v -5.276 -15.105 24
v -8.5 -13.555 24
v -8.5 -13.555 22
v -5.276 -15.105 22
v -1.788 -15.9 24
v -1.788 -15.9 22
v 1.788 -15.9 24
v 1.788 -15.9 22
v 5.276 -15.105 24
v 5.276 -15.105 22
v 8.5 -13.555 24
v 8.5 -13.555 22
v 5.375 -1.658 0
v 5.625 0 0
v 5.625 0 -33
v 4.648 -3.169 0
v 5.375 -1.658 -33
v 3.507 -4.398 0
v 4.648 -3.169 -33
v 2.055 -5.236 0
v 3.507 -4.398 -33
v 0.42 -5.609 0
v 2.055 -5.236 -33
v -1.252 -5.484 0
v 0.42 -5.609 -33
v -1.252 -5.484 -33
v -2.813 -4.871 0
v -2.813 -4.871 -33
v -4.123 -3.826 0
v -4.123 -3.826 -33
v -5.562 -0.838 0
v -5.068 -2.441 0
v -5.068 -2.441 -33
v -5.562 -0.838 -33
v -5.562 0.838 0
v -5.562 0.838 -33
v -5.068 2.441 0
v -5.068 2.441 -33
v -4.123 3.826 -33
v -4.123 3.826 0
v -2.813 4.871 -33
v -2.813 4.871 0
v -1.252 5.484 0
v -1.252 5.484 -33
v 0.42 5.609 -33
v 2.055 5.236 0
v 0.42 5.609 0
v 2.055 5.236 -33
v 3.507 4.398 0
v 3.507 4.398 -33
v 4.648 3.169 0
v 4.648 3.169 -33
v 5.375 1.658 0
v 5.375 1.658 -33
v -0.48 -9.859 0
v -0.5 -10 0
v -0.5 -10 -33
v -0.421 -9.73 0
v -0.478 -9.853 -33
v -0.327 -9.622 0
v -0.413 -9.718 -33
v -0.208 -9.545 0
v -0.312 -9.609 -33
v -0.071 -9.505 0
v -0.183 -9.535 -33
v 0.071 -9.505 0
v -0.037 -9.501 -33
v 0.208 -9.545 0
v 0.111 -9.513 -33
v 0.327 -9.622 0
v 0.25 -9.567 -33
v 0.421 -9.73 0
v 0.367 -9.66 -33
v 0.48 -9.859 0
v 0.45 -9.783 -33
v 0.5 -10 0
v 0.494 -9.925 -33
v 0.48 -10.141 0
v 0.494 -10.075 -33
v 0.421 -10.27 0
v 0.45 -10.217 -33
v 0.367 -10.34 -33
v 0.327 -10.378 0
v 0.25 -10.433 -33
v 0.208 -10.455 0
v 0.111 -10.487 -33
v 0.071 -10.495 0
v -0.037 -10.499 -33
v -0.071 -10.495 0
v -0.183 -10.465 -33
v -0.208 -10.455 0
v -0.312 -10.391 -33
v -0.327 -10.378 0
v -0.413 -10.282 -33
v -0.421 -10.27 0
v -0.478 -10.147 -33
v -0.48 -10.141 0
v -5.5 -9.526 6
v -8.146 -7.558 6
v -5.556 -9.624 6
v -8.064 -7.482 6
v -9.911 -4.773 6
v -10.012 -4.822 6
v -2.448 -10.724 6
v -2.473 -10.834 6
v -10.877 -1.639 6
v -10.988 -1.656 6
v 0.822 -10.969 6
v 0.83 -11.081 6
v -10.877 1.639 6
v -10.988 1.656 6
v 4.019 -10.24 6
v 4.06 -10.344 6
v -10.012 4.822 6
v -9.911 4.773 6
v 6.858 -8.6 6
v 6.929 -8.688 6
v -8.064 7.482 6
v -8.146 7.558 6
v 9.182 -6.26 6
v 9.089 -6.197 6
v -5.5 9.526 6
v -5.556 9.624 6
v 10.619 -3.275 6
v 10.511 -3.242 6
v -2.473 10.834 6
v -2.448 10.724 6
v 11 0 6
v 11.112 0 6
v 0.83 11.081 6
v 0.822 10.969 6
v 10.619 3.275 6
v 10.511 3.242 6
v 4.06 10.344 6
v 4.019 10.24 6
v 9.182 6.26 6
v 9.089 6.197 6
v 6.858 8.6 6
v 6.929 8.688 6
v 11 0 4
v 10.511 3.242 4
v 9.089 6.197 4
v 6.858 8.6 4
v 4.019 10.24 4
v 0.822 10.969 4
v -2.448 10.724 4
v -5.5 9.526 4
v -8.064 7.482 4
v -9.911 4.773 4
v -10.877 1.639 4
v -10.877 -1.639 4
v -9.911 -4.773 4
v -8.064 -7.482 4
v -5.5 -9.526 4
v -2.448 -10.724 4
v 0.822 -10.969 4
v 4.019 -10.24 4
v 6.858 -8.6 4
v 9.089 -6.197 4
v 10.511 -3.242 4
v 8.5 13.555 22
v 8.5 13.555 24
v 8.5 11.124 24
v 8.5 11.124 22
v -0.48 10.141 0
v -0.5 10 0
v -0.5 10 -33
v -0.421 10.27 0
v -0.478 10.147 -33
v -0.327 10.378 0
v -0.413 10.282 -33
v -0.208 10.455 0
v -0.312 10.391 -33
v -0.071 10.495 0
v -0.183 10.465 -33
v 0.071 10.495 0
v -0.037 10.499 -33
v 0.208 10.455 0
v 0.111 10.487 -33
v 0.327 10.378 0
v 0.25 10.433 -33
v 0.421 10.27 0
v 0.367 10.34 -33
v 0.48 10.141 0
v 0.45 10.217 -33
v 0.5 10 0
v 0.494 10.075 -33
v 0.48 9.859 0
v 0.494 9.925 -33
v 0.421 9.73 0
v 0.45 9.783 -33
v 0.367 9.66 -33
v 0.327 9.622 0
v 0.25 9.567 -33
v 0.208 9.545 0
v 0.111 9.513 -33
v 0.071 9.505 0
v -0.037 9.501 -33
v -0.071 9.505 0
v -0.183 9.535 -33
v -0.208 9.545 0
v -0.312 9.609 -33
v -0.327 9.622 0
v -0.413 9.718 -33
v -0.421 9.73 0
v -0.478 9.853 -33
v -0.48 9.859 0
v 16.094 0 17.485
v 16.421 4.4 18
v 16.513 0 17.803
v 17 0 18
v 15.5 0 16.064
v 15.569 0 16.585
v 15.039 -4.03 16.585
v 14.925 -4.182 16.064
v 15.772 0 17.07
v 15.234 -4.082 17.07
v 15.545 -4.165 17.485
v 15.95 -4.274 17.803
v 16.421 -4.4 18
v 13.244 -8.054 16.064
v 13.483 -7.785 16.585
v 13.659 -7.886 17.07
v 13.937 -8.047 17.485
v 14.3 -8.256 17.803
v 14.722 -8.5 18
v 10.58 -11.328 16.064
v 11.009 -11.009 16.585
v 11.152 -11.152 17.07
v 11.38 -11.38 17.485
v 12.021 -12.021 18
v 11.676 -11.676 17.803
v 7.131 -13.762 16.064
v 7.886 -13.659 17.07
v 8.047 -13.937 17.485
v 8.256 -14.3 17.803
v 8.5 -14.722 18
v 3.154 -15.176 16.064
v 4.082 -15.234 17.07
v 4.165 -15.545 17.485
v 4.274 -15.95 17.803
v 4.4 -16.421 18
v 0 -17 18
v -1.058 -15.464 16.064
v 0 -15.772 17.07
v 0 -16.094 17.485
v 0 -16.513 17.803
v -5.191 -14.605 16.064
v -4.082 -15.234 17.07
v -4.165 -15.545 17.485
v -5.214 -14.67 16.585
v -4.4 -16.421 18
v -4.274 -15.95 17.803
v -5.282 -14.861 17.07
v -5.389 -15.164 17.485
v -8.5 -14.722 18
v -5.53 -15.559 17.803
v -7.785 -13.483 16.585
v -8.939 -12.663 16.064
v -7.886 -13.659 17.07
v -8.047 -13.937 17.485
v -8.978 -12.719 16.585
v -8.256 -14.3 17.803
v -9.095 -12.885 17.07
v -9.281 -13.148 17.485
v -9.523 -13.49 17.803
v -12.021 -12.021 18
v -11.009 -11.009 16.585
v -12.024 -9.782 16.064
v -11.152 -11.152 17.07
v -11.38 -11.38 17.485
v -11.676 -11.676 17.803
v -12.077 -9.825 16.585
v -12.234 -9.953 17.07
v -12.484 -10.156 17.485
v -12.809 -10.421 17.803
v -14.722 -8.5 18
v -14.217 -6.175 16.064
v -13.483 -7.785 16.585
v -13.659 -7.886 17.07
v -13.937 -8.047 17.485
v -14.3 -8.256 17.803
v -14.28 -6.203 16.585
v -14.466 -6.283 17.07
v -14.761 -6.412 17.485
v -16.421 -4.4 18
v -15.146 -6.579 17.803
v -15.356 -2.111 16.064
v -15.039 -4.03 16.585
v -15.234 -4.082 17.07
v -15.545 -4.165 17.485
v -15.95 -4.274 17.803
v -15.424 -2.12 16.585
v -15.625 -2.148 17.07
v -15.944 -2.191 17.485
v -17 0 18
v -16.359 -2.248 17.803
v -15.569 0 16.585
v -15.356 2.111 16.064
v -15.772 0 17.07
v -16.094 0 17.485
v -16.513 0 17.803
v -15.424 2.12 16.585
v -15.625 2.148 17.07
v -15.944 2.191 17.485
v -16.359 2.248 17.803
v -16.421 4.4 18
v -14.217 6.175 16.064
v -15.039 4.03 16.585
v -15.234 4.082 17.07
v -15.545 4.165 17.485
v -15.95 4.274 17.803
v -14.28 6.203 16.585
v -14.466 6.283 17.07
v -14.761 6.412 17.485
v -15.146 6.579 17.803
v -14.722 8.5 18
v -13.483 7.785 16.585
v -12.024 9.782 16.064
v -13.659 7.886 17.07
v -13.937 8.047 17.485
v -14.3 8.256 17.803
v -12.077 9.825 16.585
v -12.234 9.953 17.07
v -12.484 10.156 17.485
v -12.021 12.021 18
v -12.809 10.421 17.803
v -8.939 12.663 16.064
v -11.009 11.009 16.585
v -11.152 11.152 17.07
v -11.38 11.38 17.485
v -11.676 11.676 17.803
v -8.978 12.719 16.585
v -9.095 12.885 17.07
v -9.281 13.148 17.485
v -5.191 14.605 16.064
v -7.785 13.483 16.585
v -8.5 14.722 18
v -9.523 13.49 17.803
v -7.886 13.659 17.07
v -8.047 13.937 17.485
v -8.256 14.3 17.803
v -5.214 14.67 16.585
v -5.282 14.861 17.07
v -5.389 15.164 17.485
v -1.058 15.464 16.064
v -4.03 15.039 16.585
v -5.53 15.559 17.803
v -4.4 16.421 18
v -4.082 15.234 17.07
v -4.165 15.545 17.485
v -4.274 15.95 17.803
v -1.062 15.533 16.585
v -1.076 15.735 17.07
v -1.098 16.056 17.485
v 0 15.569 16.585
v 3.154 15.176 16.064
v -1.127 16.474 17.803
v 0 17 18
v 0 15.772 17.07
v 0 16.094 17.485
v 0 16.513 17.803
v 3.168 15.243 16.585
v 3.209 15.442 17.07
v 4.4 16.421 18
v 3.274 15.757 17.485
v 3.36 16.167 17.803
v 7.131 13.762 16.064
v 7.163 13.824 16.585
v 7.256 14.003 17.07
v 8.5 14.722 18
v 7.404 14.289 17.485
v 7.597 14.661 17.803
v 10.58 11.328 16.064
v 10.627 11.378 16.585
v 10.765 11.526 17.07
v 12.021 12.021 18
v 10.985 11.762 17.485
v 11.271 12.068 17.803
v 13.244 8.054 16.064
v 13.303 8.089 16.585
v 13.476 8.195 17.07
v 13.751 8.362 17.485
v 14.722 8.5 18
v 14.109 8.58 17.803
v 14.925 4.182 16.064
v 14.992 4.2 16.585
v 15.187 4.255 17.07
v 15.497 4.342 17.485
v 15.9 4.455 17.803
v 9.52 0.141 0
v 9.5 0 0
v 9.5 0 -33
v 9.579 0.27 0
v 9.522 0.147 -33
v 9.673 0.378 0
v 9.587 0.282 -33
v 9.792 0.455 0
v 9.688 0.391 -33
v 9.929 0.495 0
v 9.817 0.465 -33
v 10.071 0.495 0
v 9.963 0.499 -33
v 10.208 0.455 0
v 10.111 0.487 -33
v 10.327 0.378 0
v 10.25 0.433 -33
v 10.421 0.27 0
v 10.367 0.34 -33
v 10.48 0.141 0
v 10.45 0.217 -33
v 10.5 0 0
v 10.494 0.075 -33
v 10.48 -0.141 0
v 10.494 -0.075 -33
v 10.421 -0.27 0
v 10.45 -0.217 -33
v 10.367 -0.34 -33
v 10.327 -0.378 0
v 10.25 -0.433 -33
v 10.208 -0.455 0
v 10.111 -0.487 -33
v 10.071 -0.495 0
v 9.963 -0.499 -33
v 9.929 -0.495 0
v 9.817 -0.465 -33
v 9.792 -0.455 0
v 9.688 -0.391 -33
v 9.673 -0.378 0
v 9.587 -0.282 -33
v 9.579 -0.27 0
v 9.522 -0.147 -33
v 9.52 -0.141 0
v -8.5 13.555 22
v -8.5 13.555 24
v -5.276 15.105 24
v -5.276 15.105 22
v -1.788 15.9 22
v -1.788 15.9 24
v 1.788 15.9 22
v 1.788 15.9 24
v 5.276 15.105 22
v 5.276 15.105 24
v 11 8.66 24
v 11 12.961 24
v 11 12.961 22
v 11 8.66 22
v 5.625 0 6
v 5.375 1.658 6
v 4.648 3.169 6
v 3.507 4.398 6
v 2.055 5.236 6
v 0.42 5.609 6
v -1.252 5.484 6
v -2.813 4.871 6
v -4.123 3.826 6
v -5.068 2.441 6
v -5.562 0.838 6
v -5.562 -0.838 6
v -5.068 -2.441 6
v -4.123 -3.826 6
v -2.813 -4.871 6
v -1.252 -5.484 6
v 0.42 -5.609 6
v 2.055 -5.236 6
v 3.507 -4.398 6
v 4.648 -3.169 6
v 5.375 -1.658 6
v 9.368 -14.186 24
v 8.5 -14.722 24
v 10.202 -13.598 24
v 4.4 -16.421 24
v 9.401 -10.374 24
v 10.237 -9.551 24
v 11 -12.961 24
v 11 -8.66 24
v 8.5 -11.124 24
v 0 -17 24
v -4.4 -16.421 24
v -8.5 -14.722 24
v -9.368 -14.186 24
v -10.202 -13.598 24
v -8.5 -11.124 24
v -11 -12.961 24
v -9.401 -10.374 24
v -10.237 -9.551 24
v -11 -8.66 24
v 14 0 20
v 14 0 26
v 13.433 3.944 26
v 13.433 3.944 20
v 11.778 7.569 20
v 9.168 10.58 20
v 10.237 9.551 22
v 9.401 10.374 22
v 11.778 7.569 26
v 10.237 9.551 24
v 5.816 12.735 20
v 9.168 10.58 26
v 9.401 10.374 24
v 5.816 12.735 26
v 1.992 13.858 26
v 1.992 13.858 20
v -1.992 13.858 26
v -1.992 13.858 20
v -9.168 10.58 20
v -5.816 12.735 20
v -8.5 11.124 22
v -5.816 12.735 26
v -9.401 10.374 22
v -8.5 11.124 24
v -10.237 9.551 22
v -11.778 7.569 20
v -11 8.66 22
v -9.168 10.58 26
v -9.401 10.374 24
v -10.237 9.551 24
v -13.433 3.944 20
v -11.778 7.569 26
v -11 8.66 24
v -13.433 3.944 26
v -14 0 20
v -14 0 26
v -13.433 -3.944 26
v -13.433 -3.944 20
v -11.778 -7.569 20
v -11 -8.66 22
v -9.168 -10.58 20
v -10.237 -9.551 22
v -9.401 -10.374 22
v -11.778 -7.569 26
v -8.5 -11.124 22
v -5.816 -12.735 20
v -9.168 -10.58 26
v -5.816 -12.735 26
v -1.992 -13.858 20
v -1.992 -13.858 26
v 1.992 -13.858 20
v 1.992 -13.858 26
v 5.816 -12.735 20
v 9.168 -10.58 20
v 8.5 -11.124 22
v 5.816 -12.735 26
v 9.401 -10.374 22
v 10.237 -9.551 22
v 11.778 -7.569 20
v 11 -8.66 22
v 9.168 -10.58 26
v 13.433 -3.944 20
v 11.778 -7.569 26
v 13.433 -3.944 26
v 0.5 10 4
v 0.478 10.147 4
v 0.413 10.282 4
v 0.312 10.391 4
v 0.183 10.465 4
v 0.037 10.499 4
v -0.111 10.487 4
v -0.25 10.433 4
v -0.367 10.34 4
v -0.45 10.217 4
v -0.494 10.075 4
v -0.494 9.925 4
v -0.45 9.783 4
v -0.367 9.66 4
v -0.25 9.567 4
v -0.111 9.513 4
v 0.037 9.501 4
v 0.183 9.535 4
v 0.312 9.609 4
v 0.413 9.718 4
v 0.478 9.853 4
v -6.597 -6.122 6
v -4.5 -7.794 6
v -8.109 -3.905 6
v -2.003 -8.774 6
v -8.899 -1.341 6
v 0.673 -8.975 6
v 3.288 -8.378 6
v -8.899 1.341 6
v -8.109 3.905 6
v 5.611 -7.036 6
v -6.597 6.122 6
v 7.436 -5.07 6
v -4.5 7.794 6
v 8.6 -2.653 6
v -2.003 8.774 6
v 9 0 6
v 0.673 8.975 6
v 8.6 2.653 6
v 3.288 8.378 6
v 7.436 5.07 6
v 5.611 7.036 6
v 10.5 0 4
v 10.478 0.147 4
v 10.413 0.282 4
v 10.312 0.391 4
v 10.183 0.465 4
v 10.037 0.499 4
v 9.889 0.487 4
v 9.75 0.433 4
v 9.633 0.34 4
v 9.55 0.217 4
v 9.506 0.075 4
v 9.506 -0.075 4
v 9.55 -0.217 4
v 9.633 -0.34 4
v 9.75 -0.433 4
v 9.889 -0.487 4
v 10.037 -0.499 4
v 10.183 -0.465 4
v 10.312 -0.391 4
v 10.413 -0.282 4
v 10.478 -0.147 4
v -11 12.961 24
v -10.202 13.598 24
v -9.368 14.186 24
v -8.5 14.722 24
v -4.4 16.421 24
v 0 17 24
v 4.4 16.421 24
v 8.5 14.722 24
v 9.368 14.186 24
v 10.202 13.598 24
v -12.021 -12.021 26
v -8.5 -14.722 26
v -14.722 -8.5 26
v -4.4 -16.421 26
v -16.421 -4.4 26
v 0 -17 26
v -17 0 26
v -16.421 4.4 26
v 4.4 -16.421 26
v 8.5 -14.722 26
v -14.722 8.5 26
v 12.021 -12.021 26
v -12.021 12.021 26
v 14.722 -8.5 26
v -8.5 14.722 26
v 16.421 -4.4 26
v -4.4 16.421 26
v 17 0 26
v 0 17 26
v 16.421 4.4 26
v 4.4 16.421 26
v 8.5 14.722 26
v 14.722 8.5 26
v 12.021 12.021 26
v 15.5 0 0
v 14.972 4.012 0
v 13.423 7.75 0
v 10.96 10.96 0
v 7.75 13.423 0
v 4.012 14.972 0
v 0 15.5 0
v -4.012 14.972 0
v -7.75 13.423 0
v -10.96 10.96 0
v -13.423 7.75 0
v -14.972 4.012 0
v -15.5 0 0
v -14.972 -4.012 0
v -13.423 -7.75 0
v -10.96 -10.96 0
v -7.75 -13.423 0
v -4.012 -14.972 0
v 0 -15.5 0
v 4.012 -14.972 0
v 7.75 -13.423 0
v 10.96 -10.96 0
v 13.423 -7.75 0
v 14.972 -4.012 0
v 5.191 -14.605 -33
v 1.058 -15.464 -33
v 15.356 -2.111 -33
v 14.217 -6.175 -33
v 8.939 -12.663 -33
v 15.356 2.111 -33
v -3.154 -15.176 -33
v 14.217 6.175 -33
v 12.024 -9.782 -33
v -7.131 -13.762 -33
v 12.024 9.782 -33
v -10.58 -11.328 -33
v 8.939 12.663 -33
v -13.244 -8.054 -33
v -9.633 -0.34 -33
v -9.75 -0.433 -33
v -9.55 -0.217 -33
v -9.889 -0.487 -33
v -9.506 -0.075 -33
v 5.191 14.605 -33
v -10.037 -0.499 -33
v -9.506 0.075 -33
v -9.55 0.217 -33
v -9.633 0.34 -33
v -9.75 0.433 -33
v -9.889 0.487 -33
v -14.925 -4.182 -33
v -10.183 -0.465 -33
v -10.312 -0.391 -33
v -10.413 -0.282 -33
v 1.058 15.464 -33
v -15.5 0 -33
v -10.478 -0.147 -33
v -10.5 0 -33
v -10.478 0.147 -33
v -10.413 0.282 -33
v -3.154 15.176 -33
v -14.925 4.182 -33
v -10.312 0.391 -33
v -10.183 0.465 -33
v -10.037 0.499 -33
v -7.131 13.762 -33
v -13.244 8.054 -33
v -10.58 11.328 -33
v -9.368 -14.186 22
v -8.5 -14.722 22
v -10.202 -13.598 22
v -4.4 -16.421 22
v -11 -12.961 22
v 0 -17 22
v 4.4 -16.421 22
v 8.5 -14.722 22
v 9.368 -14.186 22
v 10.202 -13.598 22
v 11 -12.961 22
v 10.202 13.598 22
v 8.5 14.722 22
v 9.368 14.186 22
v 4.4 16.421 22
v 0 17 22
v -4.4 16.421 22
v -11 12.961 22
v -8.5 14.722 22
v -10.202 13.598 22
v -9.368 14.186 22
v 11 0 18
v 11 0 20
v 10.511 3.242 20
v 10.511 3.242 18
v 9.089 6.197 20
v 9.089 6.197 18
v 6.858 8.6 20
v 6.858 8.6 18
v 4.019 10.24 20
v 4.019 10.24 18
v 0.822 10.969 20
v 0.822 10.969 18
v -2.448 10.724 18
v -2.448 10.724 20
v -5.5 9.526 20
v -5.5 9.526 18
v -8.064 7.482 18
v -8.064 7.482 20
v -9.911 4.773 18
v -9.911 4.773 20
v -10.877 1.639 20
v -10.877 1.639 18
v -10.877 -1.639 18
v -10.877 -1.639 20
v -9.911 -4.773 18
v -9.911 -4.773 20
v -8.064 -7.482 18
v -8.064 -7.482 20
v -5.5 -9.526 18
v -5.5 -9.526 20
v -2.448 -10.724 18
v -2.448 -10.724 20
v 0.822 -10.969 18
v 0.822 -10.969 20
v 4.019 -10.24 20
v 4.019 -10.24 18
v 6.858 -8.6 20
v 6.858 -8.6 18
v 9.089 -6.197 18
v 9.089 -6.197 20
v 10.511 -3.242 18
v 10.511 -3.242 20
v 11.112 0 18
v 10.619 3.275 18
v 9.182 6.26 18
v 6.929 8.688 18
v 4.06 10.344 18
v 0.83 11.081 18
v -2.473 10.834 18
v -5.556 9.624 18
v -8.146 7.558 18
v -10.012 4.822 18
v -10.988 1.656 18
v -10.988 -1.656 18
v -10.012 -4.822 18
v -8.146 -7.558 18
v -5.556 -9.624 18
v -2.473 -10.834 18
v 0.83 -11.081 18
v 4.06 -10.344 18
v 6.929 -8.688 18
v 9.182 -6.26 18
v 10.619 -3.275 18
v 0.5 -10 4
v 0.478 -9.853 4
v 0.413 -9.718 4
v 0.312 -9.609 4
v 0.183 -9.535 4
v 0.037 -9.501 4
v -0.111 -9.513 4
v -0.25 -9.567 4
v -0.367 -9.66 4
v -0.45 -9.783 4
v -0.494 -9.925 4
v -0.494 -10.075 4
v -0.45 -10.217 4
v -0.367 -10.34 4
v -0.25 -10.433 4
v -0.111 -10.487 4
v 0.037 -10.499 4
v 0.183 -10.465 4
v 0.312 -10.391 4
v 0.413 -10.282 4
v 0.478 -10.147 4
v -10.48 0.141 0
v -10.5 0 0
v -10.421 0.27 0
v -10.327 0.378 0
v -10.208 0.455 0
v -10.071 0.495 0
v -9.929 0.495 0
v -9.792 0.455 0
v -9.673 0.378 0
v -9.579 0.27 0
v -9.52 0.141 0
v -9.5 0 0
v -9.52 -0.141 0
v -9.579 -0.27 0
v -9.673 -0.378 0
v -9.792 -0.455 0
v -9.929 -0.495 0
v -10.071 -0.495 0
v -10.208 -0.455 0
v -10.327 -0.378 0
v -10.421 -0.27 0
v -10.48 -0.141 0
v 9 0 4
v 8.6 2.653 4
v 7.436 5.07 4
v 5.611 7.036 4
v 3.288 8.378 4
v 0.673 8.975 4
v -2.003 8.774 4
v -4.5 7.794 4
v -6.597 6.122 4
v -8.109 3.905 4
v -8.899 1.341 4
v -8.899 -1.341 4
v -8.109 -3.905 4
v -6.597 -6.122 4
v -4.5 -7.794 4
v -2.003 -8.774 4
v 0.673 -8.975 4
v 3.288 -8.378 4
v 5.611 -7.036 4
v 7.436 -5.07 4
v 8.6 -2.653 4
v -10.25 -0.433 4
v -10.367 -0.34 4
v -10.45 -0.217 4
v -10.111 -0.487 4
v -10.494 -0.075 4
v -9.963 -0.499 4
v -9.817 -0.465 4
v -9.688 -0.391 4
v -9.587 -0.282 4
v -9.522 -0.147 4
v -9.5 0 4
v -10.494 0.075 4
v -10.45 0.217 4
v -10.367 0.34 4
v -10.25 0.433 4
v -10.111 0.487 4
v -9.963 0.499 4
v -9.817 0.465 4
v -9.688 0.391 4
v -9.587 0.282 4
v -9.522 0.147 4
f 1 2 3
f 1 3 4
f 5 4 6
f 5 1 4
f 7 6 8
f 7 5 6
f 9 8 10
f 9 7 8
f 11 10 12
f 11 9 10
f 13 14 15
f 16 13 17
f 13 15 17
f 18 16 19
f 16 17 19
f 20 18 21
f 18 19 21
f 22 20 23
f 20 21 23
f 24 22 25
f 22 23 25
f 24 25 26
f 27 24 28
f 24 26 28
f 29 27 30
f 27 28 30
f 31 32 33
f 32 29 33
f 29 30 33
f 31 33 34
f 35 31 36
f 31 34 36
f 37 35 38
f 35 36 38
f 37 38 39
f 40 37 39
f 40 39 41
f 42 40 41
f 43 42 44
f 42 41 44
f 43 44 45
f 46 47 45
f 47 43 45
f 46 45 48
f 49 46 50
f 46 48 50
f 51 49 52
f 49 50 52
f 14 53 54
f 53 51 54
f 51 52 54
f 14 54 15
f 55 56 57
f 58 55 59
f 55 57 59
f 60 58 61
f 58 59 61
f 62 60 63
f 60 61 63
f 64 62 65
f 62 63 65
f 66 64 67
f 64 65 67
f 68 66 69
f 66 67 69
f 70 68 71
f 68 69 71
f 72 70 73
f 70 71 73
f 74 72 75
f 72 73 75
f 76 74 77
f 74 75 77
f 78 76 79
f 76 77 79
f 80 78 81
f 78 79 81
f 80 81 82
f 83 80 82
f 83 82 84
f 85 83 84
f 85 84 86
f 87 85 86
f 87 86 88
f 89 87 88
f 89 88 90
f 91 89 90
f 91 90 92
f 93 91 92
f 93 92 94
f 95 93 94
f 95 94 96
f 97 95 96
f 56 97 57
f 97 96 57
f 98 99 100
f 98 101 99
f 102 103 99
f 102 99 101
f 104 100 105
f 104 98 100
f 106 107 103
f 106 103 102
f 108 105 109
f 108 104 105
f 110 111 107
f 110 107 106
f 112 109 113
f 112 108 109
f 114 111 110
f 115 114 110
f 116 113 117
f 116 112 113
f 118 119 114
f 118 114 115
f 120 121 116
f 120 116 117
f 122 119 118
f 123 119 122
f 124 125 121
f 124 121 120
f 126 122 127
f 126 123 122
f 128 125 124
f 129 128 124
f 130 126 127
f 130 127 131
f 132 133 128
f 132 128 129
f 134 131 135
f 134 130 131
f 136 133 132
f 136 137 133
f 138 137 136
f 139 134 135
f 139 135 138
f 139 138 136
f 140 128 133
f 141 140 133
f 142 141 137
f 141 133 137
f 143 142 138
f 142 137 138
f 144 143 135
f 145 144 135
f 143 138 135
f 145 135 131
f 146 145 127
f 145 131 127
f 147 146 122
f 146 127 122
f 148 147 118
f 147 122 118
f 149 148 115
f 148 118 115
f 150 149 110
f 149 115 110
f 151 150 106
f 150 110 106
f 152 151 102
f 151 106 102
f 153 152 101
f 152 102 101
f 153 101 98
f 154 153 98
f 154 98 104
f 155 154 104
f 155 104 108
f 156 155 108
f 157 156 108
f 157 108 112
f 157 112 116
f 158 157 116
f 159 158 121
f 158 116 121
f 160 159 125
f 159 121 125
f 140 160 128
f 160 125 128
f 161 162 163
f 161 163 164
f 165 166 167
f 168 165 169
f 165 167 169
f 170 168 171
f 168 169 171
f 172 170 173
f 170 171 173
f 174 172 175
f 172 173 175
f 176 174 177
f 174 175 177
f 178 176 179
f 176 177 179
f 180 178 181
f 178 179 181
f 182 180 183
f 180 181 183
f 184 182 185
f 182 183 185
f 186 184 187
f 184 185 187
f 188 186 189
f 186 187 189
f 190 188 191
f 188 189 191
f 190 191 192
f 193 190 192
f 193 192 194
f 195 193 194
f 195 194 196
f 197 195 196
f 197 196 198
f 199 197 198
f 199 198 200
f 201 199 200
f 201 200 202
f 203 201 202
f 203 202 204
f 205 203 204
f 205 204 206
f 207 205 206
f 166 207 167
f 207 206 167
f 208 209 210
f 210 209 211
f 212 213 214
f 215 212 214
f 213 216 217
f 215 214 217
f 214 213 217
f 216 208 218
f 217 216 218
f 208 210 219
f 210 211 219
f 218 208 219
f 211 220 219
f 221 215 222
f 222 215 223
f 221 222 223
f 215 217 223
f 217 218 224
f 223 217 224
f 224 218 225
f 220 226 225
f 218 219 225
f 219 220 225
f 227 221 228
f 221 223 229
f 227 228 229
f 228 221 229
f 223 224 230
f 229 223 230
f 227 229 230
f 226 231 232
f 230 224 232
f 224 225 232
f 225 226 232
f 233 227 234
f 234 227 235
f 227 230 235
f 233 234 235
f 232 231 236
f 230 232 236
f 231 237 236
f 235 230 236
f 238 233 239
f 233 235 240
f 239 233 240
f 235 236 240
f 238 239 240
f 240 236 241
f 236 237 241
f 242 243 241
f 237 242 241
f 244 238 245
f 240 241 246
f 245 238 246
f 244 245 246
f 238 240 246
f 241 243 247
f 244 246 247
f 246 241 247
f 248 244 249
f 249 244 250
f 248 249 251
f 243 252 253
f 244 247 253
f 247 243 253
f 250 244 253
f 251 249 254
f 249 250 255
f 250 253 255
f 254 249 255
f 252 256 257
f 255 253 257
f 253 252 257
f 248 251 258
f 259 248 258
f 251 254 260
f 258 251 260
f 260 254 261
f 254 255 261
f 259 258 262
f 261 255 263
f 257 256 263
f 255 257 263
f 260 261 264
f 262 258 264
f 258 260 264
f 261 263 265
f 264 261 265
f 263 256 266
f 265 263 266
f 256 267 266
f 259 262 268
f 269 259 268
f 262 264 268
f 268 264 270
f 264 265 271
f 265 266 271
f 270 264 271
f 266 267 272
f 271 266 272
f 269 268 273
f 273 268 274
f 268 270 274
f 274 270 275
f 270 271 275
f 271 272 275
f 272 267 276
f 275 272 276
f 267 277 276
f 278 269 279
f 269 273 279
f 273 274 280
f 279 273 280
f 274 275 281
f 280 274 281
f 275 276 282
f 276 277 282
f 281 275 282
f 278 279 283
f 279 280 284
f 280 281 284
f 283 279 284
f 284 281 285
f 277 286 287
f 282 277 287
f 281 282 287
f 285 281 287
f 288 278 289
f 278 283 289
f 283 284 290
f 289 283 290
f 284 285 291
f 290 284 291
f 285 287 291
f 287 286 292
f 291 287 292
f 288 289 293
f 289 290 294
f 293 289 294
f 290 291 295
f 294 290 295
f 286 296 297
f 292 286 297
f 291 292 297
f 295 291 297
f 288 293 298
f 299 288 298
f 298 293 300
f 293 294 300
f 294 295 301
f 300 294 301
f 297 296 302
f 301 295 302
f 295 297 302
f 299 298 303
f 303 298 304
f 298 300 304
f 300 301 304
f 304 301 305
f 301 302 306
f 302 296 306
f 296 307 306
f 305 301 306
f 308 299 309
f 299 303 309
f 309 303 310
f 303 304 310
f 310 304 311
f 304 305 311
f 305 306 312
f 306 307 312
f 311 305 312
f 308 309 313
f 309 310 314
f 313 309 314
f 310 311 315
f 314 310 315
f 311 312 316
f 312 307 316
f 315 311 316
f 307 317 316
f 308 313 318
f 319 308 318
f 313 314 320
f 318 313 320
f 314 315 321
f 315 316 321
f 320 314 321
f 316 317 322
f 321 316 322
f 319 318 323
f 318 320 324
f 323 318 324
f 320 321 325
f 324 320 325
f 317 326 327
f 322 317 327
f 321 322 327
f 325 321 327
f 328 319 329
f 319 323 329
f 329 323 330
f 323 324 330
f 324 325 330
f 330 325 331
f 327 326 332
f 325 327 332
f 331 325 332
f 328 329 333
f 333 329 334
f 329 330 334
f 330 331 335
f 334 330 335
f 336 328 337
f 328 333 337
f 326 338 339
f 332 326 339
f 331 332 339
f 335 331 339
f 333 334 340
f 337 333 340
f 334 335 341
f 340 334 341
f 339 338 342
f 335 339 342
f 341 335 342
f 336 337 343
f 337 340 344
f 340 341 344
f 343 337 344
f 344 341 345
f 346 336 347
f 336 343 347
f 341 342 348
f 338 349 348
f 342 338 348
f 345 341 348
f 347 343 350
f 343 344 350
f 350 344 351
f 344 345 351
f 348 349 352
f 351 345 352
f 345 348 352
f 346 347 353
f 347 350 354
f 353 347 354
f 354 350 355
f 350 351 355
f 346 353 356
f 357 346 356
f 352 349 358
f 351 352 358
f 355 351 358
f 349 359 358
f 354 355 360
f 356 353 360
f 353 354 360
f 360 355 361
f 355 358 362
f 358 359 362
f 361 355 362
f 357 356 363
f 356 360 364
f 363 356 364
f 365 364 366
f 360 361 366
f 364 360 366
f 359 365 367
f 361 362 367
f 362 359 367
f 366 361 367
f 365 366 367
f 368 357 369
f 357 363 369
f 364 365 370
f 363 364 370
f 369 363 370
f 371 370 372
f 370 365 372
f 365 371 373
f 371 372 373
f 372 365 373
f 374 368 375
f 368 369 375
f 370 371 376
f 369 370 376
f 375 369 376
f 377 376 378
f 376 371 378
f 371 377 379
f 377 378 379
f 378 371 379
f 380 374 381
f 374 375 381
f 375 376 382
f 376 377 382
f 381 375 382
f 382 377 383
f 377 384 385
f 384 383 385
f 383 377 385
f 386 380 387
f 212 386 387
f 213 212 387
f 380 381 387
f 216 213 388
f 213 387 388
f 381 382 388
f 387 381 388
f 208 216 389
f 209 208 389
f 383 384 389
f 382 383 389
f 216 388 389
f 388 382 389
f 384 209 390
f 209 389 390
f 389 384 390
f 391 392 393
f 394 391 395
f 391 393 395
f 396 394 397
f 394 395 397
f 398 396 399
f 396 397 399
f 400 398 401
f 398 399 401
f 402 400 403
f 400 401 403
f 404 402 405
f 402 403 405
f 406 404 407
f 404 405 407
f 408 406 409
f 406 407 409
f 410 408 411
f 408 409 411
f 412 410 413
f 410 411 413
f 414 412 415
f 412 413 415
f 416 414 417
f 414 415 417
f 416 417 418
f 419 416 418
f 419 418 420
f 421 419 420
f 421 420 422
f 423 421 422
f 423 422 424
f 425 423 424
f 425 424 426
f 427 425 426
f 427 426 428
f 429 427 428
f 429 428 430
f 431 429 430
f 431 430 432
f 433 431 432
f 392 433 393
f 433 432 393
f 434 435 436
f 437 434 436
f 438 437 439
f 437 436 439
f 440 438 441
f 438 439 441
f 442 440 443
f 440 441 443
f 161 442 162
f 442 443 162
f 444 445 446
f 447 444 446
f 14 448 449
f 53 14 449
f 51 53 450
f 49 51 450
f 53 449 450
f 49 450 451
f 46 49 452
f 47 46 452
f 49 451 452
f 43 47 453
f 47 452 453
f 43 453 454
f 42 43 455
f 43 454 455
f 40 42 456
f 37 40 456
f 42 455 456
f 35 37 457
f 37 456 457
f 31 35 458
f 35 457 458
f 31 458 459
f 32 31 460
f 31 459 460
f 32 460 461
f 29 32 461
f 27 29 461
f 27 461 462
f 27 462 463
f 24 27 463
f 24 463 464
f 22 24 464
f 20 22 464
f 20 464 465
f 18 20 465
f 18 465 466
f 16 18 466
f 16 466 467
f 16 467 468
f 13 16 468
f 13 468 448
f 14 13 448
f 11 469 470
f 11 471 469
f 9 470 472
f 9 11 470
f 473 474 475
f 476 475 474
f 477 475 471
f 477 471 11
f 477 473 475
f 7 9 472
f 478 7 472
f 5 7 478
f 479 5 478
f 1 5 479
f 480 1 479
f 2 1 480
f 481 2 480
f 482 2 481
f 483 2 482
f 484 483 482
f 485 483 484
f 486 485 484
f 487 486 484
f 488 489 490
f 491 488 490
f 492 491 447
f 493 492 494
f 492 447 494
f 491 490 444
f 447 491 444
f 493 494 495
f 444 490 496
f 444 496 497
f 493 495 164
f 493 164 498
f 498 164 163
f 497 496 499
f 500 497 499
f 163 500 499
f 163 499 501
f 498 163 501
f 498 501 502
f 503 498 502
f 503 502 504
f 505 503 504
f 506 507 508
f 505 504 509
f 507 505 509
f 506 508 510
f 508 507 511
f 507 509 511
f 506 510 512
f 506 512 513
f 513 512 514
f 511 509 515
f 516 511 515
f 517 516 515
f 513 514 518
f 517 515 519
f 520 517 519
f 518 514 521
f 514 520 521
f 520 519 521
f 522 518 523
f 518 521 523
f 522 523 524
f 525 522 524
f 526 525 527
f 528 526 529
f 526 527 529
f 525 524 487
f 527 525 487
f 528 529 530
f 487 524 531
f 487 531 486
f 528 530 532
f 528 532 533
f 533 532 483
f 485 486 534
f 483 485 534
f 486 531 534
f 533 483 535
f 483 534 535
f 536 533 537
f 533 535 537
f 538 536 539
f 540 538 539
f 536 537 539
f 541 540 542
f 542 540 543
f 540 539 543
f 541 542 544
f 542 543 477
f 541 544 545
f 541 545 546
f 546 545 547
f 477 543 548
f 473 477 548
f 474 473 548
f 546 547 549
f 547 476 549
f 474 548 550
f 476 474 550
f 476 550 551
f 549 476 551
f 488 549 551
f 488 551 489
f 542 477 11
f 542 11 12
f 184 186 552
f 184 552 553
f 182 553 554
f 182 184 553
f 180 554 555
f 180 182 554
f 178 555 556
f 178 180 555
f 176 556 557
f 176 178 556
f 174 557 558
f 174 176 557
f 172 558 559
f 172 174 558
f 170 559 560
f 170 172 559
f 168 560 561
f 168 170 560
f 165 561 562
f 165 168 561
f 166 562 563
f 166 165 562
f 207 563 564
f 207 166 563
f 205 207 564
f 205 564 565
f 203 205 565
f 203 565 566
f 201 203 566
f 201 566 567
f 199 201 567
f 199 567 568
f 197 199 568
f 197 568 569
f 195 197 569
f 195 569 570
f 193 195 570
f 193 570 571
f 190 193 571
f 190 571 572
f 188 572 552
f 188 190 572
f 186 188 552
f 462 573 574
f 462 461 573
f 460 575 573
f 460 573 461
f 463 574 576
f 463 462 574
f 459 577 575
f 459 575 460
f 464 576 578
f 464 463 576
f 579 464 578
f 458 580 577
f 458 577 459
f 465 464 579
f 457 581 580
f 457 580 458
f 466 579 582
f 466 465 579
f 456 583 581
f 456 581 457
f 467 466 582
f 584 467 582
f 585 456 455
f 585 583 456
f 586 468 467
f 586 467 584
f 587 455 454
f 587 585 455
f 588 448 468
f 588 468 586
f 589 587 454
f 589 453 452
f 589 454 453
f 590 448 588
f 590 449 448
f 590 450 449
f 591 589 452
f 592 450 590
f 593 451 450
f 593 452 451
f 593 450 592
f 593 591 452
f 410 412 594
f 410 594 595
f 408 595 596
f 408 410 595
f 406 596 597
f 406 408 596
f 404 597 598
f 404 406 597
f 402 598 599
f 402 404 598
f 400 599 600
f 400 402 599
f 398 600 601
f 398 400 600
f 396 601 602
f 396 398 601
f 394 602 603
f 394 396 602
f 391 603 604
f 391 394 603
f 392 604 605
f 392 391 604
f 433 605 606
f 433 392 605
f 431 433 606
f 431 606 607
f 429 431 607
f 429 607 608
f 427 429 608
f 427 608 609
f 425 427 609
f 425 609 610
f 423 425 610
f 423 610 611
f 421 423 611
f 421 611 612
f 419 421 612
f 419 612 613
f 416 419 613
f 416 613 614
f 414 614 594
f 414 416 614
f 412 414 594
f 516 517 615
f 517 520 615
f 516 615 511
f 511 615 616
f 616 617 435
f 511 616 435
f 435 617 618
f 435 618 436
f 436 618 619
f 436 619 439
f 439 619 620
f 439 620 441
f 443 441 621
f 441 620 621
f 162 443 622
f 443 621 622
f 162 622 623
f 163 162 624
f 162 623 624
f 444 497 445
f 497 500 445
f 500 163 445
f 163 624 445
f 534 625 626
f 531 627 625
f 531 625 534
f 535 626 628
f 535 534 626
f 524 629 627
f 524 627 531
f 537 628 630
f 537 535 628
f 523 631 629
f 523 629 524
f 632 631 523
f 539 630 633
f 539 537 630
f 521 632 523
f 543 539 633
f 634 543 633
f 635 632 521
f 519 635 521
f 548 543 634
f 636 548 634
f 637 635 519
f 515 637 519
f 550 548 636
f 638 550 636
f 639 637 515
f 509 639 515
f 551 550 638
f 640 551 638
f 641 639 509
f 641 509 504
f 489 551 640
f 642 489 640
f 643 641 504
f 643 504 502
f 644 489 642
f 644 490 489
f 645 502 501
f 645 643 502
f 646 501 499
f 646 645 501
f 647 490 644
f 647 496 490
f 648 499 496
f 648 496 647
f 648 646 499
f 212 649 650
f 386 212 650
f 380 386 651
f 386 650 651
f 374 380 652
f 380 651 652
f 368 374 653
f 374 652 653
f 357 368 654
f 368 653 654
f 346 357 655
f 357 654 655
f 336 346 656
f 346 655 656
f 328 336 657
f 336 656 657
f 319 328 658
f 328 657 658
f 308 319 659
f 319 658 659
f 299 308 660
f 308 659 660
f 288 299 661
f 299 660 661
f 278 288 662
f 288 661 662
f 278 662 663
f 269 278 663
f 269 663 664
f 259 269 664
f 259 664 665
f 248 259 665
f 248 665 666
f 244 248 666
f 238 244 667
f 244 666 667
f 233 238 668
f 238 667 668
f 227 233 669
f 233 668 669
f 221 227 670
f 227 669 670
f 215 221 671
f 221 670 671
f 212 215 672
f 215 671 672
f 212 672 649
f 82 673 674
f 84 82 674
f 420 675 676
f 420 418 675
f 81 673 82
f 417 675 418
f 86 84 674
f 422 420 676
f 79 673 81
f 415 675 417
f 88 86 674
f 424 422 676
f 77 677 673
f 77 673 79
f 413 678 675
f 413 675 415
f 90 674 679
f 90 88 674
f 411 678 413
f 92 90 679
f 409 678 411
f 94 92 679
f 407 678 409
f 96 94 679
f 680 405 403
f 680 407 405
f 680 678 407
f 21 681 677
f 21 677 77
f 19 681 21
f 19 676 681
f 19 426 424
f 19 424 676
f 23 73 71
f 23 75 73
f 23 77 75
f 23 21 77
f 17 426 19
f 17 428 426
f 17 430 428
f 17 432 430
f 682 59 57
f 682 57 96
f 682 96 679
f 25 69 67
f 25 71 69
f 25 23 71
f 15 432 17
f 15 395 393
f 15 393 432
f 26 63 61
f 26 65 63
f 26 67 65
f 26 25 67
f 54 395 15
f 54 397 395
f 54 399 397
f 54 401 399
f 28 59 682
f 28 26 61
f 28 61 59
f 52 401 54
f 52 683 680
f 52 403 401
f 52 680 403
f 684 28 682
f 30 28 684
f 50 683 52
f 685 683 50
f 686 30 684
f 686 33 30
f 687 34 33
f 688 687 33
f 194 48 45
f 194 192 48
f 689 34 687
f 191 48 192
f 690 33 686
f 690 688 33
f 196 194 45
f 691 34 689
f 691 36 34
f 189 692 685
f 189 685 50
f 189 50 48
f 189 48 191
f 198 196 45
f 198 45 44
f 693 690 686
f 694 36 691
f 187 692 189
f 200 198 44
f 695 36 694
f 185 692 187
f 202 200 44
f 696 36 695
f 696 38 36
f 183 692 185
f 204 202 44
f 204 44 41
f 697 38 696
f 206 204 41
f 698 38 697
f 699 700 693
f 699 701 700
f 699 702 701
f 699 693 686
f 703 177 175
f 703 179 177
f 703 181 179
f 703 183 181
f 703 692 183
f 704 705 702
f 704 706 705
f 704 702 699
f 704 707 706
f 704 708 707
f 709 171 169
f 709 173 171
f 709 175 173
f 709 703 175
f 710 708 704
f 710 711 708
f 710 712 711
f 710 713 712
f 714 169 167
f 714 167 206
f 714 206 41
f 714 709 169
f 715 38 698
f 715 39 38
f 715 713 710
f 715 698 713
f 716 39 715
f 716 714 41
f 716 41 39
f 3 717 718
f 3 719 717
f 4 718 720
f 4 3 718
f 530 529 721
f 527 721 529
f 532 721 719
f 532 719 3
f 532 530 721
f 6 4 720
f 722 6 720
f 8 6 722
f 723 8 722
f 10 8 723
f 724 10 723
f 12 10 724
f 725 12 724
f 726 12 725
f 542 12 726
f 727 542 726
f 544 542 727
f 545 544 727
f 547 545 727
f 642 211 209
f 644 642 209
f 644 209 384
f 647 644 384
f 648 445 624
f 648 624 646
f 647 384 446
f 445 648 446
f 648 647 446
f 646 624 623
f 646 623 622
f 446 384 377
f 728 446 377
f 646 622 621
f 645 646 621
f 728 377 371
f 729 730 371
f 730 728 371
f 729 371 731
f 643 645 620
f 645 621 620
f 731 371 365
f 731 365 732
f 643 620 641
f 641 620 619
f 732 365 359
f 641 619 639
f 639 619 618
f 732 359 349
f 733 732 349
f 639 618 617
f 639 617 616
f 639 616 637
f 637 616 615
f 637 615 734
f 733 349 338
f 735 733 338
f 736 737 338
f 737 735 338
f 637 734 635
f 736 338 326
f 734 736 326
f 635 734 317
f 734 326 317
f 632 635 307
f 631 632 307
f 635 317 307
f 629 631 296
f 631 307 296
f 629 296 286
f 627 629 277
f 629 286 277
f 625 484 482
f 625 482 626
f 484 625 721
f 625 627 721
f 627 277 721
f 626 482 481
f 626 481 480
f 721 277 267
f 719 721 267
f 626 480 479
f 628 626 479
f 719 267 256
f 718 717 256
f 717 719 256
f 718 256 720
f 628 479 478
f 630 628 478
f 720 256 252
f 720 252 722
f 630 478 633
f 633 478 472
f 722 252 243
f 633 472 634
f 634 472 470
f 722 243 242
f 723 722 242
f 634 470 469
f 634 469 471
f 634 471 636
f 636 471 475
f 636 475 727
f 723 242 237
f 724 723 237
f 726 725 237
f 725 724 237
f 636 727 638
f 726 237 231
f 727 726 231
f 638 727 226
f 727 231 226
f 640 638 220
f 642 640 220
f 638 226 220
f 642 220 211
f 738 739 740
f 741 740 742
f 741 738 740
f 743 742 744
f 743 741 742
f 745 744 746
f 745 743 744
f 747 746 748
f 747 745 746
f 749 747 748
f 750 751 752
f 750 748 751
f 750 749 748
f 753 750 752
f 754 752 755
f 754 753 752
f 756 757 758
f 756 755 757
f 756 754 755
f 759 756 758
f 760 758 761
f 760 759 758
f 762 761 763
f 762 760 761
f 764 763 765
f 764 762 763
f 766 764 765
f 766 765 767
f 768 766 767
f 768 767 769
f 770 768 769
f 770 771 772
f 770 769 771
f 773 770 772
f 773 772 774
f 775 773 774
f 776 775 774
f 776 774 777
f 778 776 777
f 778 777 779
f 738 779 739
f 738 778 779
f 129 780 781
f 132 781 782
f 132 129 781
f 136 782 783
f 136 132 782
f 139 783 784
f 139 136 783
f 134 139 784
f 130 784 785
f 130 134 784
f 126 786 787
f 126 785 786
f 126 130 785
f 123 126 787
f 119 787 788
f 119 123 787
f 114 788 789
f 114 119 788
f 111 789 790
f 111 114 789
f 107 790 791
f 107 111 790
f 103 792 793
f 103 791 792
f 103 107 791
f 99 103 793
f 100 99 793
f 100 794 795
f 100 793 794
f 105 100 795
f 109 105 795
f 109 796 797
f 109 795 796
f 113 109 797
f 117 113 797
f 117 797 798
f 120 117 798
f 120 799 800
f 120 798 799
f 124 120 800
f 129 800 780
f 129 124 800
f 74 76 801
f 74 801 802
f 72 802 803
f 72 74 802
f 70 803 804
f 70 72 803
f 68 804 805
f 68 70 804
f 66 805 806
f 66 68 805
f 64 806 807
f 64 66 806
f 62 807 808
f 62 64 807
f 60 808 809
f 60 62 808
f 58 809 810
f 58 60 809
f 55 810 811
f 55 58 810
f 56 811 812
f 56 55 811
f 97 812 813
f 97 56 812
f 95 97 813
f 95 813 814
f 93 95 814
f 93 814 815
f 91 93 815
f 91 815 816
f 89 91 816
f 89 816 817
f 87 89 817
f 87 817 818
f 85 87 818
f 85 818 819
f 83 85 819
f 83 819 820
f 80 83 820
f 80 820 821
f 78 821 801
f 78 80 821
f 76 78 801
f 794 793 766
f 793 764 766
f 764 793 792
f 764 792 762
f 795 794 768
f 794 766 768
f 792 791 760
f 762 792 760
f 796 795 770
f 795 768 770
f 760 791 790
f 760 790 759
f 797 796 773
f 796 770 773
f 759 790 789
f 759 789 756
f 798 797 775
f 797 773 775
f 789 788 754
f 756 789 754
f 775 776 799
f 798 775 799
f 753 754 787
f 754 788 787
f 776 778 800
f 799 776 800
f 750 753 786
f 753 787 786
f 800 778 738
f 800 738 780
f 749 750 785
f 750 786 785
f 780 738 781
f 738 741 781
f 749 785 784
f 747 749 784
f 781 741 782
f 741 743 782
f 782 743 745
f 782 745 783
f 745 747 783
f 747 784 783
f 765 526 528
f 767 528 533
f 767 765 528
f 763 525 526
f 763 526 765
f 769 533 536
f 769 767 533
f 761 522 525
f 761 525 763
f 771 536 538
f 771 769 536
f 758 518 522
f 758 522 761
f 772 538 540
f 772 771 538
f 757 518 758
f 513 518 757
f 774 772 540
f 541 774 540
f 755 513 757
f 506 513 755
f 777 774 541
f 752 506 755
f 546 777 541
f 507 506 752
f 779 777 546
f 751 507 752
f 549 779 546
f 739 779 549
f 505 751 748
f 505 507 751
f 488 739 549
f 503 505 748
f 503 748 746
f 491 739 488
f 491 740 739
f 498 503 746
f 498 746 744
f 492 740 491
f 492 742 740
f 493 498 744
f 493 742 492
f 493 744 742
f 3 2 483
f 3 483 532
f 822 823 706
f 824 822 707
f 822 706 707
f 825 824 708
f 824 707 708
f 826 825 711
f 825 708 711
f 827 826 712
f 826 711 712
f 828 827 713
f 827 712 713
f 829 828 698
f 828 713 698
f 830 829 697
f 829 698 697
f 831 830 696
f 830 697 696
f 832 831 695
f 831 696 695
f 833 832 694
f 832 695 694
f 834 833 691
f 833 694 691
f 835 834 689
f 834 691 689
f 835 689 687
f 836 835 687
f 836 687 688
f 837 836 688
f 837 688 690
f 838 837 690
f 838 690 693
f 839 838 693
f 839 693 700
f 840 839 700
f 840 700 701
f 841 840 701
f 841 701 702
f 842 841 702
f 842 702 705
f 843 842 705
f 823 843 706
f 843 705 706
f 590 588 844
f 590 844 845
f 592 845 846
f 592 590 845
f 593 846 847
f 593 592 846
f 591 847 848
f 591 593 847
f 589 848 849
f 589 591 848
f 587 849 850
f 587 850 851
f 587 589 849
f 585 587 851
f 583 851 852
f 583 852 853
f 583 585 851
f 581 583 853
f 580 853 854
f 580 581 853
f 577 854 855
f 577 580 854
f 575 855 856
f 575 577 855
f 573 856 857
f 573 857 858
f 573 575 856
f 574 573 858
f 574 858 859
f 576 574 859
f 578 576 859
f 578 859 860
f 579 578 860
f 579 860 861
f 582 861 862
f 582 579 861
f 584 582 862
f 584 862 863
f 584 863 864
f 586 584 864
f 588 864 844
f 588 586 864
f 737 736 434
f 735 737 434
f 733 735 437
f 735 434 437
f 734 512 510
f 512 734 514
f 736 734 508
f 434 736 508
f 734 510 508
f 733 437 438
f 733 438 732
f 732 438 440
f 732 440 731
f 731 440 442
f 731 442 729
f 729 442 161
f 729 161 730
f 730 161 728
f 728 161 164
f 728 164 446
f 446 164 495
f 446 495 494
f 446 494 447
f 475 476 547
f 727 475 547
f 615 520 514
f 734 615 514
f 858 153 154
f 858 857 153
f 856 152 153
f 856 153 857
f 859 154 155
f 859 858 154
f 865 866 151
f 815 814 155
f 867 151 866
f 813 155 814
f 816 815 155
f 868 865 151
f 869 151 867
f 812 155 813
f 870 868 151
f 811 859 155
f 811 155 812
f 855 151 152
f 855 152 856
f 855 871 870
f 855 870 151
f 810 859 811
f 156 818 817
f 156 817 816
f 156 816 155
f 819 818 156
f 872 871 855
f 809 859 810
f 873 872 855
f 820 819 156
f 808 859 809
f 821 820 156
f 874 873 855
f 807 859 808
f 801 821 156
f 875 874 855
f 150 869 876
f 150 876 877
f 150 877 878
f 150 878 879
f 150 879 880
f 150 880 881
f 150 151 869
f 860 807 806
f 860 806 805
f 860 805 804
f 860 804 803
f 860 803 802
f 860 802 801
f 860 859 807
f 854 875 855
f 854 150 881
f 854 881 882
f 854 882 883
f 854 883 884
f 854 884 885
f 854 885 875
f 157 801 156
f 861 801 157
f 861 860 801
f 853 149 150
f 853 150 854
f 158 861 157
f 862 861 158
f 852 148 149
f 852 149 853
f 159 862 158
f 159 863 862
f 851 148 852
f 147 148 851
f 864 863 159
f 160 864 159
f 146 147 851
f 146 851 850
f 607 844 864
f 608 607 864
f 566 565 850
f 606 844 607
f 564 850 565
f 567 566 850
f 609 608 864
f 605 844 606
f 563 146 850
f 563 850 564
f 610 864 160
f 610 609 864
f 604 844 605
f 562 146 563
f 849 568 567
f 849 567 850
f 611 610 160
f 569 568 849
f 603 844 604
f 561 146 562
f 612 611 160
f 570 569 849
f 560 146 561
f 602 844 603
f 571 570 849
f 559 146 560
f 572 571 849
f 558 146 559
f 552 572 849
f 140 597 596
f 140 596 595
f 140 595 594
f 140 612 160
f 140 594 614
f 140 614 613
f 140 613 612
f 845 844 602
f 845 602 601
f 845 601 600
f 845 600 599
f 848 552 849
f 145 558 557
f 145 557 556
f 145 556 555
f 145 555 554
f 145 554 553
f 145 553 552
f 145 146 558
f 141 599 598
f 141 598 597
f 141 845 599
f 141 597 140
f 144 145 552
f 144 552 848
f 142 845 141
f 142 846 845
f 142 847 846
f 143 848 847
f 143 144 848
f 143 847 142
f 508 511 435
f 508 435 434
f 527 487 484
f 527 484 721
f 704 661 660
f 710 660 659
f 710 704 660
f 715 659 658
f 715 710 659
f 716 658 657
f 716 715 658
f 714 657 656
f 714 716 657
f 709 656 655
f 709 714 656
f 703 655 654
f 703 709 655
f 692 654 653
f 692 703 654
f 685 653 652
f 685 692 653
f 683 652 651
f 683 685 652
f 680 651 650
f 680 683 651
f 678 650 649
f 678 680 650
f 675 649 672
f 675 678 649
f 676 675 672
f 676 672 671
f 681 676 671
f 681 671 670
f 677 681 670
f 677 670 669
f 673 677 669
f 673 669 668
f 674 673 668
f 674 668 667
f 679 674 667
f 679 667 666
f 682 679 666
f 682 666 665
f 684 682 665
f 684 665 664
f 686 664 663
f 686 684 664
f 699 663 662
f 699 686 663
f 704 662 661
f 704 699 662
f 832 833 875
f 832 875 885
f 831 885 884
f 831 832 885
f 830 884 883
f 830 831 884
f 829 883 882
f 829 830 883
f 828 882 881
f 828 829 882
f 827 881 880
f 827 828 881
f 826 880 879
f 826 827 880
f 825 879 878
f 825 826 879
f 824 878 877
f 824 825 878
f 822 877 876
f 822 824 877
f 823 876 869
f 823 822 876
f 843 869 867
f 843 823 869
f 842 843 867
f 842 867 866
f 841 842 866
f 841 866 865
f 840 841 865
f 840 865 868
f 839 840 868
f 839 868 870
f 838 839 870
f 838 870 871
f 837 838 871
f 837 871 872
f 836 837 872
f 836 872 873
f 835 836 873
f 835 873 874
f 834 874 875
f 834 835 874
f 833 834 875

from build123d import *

# Parameters (mm, degrees)
SKETCH1_R                = 15.5
BOSS_EXTRUDE5_DEPTH      = 26
SKETCH3_R                = 5.625
CUT_EXTRUDE2_DEPTH       = 35.007352146
CUT_EXTRUDE3_DEPTH       = 28
CUT_EXTRUDE3_DEPTH_BACK  = 20
SKETCH4_R                = 11.1125
CUT_EXTRUDE6_START       = 6
SKETCH7_R                = 11
SKETCH7_R_2              = 9
CUT_EXTRUDE6_DEPTH       = 2
BOSS_EXTRUDE8_DEPTH      = 6
BOSS_EXTRUDE8_DEPTH_BACK = 2
BOSS_EXTRUDE8_START      = 20
SKETCH12_R               = 17
CUT_EXTRUDE10_START      = 18
SKETCH13_R               = 11
CUT_EXTRUDE10_DEPTH      = 18.411862419
FILLET2_R                = 2
CUT_EXTRUDE11_START      = 26
SKETCH14_R               = 14
CUT_EXTRUDE11_DEPTH      = 6
SKETCH15_R               = 0.5
CUT_EXTRUDE14_DEPTH      = 36.411862419
SKETCH18_W               = 2.5
SKETCH18_H               = 2
CUT_EXTRUDE15_DEPTH      = 20
CUT_EXTRUDE16_DEPTH      = 2
BOSS_EXTRUDE9_START      = 33
SKETCH26_R               = 15.5
SKETCH26_R_2             = 5.625
SKETCH26_R_3             = 0.5
BOSS_EXTRUDE9_DEPTH      = 33


with BuildPart() as part:
    # Sketch1 → Boss-Extrude5 (new body)
    with BuildSketch(Plane.XY):
        Circle(SKETCH1_R)
    extrude(amount=BOSS_EXTRUDE5_DEPTH)

    # Sketch3 → Cut-Extrude2 (cut, through all)
    with BuildSketch(Plane.XY.offset(26)):
        Circle(SKETCH3_R)
    extrude(amount=-CUT_EXTRUDE2_DEPTH, mode=Mode.SUBTRACT)

    # Sketch4 → Cut-Extrude3 (cut, two sides: drawn at the far end of the back side and taken through both)
    with BuildSketch(Plane.XY.offset(26).offset(-CUT_EXTRUDE3_DEPTH_BACK)):
        Circle(SKETCH4_R)
    extrude(amount=CUT_EXTRUDE3_DEPTH + CUT_EXTRUDE3_DEPTH_BACK, mode=Mode.SUBTRACT)

    # Sketch7 → Cut-Extrude6 (cut)
    with BuildSketch(Plane.XY.offset(CUT_EXTRUDE6_START)):
        Circle(SKETCH7_R)
        Circle(SKETCH7_R_2, mode=Mode.SUBTRACT)
    extrude(amount=-CUT_EXTRUDE6_DEPTH, mode=Mode.SUBTRACT)

    # Sketch12 → Boss-Extrude8 (add, two sides: drawn at the far end of the back side and taken through both)
    with BuildSketch(Plane.XY.offset(BOSS_EXTRUDE8_START - BOSS_EXTRUDE8_DEPTH_BACK)):
        Circle(SKETCH12_R)
    extrude(amount=BOSS_EXTRUDE8_DEPTH + BOSS_EXTRUDE8_DEPTH_BACK)

    # Sketch13 → Cut-Extrude10 (cut, through all)
    with BuildSketch(Plane.XY.offset(CUT_EXTRUDE10_START)):
        Circle(SKETCH13_R)
    extrude(amount=CUT_EXTRUDE10_DEPTH, mode=Mode.SUBTRACT)

    # Fillet2
    # the kernel refuses this fillet: 2 mm, written as the material it adds along each edge
    with BuildSketch(Plane(origin=(0, 0, 18), x_dir=(1, 0, 0), z_dir=(0, 1, 0))) as fillet2_piece_1:
        with BuildLine():
            CenterArc((17.5, 1.936491673), FILLET2_R, 180, 75.522487814)
            Line((17, 0), (16.99, -0.038729833))
            ThreePointArc((16.99, -0.038729833), (16.25, -0.04), (15.5, -0.04))
            Line((15.5, -0.04), (15.46, 0))
            Line((15.46, 0), (15.46, 1.936491673))
            Line((15.46, 1.936491673), (15.5, 1.936491673))
        make_face()
    revolve(axis=Axis((0, 0, 18), (0, 0, -1)))

    # Sketch14 → Cut-Extrude11 (cut)
    with BuildSketch(Plane.XY.offset(CUT_EXTRUDE11_START)):
        Circle(SKETCH14_R)
    extrude(amount=-CUT_EXTRUDE11_DEPTH, mode=Mode.SUBTRACT)

    # Sketch15 → Cut-Extrude14 (cut, through all)
    with BuildSketch(Plane.XY):
        with Locations((0, 10)):
            Circle(SKETCH15_R)
        with Locations((0, -10)):
            Circle(SKETCH15_R)
        with Locations((10, 0)):
            Circle(SKETCH15_R)
        with Locations((-10, 0)):
            Circle(SKETCH15_R)
    extrude(amount=CUT_EXTRUDE14_DEPTH, mode=Mode.SUBTRACT)

    # Sketch18 → Cut-Extrude15 (cut, symmetric)
    with BuildSketch(Plane(origin=(0, 0, 0), x_dir=(1, 0, 0), z_dir=(0, 1, 0))):
        with Locations((-9.75, -23)):
            Rectangle(SKETCH18_W, SKETCH18_H)
        with Locations((9.75, -23)):
            Rectangle(SKETCH18_W, SKETCH18_H)
    extrude(amount=CUT_EXTRUDE15_DEPTH, both=True, mode=Mode.SUBTRACT)

    # Sketch23 → Cut-Extrude16 (cut)
    with BuildSketch(Plane(origin=(0, 0, 24), x_dir=(-1, 0, 0), z_dir=(0, 0, -1))):
        with BuildLine():
            Line((9.719197711, 13.947659153), (9.147480199, 13.127208615))
            ThreePointArc((9.147480199, 13.127208615), (0, 16), (-9.147480199, 13.127208615))
            Line((-9.147480199, 13.127208615), (-9.719197711, 13.947659153))
            ThreePointArc((-9.719197711, 13.947659153), (0, 17), (9.719197711, 13.947659153))
        make_face()
        with BuildLine():
            Line((-9.147480199, -13.127208615), (-9.719197711, -13.947659153))
            ThreePointArc((-9.719197711, -13.947659153), (0, -17), (9.719197711, -13.947659153))
            Line((9.719197711, -13.947659153), (9.147480199, -13.127208615))
            ThreePointArc((9.147480199, -13.127208615), (0, -16), (-9.147480199, -13.127208615))
        make_face()
    extrude(amount=CUT_EXTRUDE16_DEPTH, mode=Mode.SUBTRACT)

    # Sketch26 → Boss-Extrude9 (add)
    with BuildSketch(Plane(origin=(0, 0, 0), x_dir=(-1, 0, 0), z_dir=(0, 0, -1)).offset(BOSS_EXTRUDE9_START)):
        Circle(SKETCH26_R)
        with Locations(Location((0, 0, 0), (0, 0, 180))):
            Circle(SKETCH26_R_2, mode=Mode.SUBTRACT)
        with Locations((-10, 0)):
            Circle(SKETCH26_R_3, mode=Mode.SUBTRACT)
        with Locations((0, 10)):
            Circle(SKETCH26_R_3, mode=Mode.SUBTRACT)
        with Locations((10, 0)):
            Circle(SKETCH26_R_3, mode=Mode.SUBTRACT)
        with Locations((0, -10)):
            Circle(SKETCH26_R_3, mode=Mode.SUBTRACT)
    extrude(amount=-BOSS_EXTRUDE9_DEPTH)


solid = part.part
